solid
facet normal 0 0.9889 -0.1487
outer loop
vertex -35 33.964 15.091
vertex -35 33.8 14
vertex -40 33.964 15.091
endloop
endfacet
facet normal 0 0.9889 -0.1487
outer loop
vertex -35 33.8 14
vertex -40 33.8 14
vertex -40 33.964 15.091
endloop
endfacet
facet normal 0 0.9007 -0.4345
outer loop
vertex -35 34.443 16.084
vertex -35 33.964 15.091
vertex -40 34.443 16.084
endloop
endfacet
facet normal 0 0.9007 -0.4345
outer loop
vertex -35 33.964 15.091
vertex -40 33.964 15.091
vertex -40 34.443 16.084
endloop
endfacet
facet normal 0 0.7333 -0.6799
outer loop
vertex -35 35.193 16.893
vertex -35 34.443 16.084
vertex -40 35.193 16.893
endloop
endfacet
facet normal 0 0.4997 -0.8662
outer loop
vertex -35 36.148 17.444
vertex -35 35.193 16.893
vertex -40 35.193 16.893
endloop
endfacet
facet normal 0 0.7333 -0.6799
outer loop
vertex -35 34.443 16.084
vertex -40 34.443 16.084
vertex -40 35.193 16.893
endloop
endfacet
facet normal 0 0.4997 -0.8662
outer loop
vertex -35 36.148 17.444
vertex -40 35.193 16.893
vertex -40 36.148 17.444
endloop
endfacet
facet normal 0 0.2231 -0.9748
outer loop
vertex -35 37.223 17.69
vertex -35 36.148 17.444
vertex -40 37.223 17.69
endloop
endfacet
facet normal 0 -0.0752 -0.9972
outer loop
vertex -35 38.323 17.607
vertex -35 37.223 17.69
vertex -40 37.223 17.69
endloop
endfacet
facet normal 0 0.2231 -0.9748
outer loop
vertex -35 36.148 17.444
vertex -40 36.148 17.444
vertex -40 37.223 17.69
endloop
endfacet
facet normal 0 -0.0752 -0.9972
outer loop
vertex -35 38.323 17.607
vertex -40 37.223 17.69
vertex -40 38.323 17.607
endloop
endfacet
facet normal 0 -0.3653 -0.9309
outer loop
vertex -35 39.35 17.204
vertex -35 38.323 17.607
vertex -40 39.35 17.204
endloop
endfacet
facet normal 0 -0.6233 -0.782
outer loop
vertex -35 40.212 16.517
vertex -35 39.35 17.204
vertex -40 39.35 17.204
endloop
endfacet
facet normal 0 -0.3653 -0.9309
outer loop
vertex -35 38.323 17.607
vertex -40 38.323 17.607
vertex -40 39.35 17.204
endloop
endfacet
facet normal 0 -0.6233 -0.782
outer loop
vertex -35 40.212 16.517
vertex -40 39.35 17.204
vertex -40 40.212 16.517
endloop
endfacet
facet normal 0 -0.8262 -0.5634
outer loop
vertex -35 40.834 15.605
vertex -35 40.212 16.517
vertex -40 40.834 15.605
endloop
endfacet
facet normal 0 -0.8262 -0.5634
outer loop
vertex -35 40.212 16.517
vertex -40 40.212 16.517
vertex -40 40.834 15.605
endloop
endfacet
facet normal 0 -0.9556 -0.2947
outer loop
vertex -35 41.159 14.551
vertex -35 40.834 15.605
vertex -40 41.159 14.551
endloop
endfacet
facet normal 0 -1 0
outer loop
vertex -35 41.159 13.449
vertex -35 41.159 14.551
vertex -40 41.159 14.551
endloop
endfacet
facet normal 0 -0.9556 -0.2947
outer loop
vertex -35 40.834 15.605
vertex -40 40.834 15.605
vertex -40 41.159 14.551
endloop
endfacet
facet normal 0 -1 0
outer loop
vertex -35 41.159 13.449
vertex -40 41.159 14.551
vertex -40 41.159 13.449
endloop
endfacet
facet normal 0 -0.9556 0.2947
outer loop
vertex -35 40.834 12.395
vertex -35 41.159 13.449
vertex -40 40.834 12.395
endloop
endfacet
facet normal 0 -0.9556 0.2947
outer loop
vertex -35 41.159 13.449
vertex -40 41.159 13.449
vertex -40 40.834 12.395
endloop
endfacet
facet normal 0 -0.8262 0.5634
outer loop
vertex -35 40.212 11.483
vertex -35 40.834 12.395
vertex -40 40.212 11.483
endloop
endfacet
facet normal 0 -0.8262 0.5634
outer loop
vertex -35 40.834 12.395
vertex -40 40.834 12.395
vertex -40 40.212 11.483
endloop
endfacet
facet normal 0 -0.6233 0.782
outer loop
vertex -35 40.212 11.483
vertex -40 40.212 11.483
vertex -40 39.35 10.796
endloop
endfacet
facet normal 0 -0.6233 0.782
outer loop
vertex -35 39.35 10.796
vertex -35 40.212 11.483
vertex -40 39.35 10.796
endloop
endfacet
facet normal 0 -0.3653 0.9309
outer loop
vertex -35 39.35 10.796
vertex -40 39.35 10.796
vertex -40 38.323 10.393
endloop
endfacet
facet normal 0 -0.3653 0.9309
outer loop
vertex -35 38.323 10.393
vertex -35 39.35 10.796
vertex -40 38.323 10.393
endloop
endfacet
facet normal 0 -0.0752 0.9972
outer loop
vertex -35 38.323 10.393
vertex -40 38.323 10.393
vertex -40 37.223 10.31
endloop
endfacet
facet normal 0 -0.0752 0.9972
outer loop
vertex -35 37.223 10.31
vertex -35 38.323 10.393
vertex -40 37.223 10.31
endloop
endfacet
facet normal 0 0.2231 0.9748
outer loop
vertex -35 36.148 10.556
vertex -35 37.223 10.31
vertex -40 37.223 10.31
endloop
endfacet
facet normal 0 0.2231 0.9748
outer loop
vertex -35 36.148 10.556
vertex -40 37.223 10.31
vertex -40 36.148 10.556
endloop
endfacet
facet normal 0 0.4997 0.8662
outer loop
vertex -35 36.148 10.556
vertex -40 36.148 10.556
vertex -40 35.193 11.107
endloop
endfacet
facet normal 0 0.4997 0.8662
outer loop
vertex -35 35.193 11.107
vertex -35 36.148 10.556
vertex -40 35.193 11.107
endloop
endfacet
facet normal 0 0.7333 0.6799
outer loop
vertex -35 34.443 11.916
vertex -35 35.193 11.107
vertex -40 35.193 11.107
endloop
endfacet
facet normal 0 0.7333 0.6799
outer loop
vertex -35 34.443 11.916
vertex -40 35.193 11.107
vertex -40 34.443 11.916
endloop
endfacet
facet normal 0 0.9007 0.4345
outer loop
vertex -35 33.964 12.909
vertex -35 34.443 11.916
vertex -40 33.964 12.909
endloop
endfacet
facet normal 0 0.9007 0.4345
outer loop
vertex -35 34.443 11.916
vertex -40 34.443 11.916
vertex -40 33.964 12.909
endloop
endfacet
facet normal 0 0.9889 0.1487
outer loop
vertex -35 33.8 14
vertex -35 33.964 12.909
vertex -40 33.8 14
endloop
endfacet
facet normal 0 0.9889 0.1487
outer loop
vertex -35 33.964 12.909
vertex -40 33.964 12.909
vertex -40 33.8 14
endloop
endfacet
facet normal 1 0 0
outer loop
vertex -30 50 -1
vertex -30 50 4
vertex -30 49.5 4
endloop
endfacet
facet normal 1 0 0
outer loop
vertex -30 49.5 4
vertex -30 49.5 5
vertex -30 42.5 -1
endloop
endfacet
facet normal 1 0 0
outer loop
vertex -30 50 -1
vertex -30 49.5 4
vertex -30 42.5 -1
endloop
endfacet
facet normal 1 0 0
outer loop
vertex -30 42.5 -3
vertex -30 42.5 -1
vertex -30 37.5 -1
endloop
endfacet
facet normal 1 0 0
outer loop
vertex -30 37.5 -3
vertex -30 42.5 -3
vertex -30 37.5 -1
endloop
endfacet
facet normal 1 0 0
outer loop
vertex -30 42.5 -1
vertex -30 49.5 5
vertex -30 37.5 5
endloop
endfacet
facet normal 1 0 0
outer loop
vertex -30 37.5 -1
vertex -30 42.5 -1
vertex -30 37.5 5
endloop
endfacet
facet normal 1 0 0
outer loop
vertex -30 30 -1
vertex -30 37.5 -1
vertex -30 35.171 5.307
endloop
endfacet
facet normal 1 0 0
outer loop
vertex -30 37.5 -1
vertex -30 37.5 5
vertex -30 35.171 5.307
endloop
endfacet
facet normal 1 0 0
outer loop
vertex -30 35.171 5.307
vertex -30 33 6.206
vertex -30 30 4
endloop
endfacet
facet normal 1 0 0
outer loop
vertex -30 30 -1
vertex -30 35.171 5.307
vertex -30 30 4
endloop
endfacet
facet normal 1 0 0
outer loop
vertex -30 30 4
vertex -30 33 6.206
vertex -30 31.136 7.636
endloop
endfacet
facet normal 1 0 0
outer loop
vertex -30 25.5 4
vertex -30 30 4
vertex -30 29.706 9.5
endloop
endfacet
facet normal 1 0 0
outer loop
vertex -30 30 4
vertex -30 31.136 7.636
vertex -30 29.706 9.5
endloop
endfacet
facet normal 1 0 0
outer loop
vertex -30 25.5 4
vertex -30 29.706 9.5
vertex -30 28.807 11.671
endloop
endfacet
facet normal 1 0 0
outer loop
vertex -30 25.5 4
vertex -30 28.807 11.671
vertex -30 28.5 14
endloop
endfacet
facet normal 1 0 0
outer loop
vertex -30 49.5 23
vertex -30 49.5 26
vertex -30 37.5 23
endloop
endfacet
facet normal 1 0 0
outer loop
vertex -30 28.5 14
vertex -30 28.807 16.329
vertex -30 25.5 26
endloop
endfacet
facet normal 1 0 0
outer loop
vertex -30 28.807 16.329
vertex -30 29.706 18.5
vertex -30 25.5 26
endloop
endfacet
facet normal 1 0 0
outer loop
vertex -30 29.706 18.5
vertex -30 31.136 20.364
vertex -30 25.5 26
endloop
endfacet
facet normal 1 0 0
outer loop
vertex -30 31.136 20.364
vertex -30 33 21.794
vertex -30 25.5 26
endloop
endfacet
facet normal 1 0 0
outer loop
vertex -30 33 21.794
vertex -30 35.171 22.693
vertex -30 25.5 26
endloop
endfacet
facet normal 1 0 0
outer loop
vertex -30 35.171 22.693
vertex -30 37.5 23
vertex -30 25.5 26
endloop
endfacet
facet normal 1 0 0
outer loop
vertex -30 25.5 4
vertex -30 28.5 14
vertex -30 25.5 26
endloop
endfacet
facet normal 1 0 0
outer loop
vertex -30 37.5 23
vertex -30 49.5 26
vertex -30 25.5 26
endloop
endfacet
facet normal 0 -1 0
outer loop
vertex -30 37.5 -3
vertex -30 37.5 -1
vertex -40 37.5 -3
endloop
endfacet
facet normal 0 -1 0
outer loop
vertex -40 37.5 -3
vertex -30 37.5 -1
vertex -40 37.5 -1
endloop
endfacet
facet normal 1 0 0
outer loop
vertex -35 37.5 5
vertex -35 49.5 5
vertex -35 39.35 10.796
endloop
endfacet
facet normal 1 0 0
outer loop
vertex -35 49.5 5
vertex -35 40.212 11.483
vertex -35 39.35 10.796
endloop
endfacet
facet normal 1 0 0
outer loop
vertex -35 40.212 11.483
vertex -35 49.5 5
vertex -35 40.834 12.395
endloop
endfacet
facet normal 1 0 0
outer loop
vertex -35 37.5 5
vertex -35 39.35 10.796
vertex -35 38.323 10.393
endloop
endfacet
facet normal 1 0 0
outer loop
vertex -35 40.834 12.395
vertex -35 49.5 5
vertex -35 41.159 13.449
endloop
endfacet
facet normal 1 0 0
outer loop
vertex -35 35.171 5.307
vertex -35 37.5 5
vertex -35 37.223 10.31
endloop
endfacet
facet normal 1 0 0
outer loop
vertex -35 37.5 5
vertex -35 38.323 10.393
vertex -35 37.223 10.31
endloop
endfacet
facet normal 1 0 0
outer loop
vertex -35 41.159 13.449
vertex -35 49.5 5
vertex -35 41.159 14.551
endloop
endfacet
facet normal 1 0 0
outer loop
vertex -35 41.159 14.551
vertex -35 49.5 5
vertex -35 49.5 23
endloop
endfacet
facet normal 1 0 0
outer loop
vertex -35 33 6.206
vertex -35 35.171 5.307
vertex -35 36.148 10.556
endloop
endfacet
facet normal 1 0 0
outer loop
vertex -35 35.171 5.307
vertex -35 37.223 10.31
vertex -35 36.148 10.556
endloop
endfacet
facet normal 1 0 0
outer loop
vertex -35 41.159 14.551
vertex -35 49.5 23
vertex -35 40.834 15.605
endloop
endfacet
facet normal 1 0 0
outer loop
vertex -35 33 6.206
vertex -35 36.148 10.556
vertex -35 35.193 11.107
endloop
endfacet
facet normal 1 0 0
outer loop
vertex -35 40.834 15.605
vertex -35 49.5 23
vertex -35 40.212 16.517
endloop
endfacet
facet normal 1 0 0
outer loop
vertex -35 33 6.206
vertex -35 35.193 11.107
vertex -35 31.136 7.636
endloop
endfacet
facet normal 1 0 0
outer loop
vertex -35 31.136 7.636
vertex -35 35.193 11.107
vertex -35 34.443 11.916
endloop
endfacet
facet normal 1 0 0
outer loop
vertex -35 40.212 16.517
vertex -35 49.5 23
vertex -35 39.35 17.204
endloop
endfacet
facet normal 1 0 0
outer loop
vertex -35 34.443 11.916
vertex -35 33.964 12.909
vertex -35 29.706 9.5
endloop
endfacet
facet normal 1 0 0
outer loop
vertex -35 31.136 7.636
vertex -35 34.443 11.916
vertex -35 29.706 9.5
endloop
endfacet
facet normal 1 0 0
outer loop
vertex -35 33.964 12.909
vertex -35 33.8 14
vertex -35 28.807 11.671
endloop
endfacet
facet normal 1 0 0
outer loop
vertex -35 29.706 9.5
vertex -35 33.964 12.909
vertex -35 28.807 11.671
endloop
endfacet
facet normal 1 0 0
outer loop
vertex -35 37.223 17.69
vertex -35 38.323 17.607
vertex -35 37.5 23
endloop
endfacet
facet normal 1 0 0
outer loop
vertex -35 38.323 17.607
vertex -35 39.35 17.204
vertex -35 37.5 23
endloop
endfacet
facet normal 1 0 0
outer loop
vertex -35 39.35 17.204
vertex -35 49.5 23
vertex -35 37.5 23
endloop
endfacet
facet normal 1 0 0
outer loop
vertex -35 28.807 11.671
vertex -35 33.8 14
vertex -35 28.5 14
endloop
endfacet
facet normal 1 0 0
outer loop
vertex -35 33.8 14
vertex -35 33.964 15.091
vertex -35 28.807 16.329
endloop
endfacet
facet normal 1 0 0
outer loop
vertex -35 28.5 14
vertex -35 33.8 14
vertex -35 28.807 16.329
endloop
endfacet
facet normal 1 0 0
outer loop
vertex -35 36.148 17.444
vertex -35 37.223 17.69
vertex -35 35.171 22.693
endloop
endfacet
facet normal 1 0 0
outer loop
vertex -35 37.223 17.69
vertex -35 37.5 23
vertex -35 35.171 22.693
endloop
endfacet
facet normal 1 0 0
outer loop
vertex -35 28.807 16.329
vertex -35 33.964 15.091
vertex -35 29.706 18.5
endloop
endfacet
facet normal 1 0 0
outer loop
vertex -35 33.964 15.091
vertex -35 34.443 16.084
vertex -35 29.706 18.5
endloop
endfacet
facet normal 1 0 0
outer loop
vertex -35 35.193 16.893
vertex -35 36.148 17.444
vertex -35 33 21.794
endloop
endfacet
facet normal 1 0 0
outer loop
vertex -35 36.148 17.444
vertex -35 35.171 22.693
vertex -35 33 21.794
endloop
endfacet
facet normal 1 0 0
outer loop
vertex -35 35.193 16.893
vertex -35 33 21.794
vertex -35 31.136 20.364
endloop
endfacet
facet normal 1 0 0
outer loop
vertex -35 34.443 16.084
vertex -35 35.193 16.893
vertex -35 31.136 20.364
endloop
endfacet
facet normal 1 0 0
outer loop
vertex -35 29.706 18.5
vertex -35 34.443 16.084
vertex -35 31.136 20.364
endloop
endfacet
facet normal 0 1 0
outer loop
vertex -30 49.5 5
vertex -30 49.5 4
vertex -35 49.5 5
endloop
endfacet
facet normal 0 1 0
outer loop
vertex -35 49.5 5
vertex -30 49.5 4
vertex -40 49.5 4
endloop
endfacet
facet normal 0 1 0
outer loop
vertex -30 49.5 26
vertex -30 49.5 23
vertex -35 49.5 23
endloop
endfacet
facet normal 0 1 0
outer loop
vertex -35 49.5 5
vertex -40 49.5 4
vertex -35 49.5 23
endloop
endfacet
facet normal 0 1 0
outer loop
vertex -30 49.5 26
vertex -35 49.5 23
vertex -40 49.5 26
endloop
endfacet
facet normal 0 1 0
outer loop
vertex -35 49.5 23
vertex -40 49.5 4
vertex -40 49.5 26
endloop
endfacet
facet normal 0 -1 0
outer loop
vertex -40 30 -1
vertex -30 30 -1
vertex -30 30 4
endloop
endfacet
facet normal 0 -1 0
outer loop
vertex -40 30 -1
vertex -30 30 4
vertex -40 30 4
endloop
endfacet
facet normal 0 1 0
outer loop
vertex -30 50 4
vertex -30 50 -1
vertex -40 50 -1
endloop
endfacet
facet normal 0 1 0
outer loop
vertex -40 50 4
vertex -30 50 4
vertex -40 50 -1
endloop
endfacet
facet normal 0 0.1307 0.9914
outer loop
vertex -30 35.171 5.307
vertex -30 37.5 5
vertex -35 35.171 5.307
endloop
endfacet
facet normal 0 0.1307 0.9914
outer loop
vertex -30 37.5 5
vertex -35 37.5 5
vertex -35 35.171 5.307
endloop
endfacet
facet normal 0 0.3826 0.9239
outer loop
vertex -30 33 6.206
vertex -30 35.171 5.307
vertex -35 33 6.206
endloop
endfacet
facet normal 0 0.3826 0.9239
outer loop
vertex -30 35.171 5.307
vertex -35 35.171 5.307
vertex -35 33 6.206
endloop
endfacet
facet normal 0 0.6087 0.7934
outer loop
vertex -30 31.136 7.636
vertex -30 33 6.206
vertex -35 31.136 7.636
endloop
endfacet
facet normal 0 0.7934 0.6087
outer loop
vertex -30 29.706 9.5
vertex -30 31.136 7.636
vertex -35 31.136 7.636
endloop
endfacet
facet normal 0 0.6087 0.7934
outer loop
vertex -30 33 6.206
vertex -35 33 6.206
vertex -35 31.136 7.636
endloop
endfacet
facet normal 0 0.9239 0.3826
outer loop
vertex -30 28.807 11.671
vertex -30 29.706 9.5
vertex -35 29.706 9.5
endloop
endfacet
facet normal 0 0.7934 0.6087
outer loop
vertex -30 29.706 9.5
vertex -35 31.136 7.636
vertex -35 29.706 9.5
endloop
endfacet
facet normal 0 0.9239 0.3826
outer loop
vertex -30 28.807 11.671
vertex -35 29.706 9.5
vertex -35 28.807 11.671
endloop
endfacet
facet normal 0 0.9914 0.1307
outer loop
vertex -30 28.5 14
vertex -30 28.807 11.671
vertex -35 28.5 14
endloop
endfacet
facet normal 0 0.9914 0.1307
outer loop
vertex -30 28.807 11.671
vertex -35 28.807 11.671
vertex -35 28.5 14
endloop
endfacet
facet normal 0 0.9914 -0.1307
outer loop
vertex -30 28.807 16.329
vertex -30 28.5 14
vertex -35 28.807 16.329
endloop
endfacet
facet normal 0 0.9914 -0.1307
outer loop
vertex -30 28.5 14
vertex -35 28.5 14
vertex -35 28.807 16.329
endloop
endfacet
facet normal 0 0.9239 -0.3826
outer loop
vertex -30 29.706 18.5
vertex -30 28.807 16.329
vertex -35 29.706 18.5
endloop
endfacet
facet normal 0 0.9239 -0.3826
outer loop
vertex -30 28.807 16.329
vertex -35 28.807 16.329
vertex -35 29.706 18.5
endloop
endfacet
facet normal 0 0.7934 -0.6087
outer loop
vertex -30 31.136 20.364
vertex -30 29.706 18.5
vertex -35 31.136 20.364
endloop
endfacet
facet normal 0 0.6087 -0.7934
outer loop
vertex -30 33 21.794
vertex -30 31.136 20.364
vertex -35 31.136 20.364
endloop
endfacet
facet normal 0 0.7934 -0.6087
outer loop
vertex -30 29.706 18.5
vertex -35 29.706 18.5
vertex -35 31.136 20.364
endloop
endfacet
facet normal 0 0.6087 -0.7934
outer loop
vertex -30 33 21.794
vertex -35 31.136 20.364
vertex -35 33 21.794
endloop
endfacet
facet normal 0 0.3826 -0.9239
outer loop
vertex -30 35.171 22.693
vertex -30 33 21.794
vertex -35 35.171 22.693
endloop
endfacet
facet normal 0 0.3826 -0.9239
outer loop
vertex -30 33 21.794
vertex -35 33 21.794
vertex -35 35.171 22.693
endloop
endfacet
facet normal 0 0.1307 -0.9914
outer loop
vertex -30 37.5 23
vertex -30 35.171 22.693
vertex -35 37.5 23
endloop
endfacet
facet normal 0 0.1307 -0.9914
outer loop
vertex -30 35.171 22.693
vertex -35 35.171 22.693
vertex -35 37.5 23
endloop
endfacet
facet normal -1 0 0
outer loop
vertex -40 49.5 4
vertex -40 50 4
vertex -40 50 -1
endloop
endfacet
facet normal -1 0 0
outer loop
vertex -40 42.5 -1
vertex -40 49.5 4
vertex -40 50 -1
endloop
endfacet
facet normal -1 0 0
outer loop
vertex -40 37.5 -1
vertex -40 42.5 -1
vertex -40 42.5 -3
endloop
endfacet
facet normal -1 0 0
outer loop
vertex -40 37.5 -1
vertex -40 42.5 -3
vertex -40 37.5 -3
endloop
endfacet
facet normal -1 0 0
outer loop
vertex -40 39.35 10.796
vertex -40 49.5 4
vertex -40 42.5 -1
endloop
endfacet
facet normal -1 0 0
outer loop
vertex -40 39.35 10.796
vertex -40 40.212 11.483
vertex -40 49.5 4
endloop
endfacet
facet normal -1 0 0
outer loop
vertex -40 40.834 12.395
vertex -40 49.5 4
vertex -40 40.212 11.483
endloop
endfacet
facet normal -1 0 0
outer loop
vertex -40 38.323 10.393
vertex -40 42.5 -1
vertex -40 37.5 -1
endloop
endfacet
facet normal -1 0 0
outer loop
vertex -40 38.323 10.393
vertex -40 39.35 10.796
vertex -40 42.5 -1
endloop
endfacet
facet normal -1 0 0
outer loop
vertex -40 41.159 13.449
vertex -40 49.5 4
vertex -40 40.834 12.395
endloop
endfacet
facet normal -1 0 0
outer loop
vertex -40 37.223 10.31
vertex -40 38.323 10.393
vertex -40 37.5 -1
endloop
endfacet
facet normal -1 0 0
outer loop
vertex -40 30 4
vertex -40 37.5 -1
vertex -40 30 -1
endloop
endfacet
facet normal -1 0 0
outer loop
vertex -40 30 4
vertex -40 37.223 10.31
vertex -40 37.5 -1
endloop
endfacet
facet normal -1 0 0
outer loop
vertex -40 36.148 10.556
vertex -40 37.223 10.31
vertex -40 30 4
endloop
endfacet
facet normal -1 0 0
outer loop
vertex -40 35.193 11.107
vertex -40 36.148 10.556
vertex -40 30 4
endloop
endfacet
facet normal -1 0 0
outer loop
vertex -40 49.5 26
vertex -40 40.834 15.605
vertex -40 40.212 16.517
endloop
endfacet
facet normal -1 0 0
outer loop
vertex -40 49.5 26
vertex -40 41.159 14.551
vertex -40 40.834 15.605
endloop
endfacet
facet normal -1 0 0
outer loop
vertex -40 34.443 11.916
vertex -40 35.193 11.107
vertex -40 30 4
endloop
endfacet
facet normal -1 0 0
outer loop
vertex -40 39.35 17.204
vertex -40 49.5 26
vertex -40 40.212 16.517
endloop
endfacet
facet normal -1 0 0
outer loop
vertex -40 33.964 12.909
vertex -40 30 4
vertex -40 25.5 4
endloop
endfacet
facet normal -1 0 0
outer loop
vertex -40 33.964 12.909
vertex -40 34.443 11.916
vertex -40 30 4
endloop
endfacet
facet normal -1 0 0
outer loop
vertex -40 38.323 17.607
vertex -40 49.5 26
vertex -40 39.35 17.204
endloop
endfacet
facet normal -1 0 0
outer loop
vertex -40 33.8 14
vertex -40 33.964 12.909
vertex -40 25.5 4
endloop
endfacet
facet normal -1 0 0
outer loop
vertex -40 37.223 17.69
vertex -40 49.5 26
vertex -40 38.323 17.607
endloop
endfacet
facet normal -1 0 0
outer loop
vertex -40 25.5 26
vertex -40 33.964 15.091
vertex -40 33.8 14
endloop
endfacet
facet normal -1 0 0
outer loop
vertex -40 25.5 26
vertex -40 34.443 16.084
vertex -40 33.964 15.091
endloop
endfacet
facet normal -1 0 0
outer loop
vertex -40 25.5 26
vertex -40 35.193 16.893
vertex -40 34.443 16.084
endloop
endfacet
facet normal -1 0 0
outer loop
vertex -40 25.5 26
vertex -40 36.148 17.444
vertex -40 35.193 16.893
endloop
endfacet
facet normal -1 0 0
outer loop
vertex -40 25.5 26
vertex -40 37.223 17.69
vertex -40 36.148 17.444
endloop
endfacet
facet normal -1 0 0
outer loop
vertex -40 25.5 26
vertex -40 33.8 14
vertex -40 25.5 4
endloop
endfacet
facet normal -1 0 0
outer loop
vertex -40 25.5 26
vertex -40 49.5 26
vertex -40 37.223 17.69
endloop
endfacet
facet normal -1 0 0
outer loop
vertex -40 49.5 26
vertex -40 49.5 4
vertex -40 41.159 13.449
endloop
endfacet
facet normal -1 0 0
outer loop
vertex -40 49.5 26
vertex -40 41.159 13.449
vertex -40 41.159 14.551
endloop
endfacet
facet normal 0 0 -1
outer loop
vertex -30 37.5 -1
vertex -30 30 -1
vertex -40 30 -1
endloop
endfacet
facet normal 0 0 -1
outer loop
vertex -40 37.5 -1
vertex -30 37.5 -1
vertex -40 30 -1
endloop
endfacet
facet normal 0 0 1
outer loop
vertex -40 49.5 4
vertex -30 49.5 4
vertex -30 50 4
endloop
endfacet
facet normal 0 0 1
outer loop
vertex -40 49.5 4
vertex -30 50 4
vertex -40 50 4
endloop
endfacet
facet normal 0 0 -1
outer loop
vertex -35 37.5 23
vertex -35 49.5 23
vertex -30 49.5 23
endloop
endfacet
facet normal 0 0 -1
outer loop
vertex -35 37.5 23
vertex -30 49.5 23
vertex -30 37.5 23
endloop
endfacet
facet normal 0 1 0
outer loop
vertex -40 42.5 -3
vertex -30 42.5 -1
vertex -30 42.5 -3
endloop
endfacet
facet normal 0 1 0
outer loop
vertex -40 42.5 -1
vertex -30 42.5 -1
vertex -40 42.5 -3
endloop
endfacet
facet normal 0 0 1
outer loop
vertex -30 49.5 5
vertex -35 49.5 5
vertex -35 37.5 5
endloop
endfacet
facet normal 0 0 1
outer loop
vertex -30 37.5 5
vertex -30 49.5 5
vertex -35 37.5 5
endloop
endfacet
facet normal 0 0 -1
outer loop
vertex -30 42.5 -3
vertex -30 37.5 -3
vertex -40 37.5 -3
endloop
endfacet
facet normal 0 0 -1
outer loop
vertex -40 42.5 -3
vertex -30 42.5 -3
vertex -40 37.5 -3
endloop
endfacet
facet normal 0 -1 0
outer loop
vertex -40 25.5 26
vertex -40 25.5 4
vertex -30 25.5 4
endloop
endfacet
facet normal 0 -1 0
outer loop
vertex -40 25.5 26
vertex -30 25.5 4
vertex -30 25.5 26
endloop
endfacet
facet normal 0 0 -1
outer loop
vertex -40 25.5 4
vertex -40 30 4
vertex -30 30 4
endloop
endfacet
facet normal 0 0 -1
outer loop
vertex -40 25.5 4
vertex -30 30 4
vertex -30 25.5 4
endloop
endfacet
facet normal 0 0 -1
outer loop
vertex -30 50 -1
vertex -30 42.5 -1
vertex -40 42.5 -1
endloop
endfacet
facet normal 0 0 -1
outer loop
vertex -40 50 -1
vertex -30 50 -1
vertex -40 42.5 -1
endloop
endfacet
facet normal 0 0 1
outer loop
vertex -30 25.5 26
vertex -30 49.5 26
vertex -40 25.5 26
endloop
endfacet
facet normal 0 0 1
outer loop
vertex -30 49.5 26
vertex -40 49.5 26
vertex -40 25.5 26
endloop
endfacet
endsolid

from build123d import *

# Parameters (mm, degrees)
SKETCH052_W             = 10
SKETCH052_H             = 20
PAD024_DEPTH            = 5
SKETCH049_W             = 10
SKETCH049_H             = 10
PAD023_DEPTH            = 6
SKETCH050_W             = 24
SKETCH050_H             = 22
PAD025_DEPTH            = 5
SKETCH048_W             = 16
SKETCH048_H             = 18
POCKET019_DEPTH         = 6
SKETCH051_R             = 3.7
POCKET018_DEPTH         = 10
SKETCH053_W             = 10
SKETCH053_H             = 5
PAD026_DEPTH            = 2
SKETCH064_R             = 9
POCKET024_DEPTH         = 5
BODY010_PLACEMENT_ANGLE = 180


with BuildPart() as part:
    # Sketch052 → Pad024 (new body)
    with BuildSketch(Plane.XY):
        with Locations((0, -2.5)):
            Rectangle(SKETCH052_W, SKETCH052_H)
    extrude(amount=PAD024_DEPTH)

    # Sketch049 → Pad023 (join)
    with BuildSketch(Plane.XY):
        Rectangle(SKETCH049_W, SKETCH049_H)
    extrude(amount=PAD023_DEPTH)

    # Sketch050 → Pad025 (join, symmetric)
    with BuildSketch(Plane.YZ):
        with Locations((0, 16)):
            Rectangle(SKETCH050_W, SKETCH050_H)
    extrude(amount=PAD025_DEPTH, both=True)

    # Sketch048 → Pocket019 (cut)
    with BuildSketch(Plane.YZ):
        with Locations((-8, 15)):
            Rectangle(SKETCH048_W, SKETCH048_H)
    extrude(amount=-POCKET019_DEPTH, mode=Mode.SUBTRACT)

    # Sketch051 → Pocket018 (cut, symmetric)
    with BuildSketch(Plane.YZ):
        with Locations((0, 15)):
            Circle(SKETCH051_R)
    extrude(amount=POCKET018_DEPTH, both=True, mode=Mode.SUBTRACT)

    # Sketch053 → Pad026 (join)
    with BuildSketch(Plane.XY):
        with Locations((0, -2.5)):
            Rectangle(SKETCH053_W, SKETCH053_H)
    extrude(amount=-PAD026_DEPTH)

    # Sketch064 → Pocket024 (cut)
    with BuildSketch(Plane.YZ):
        with Locations((0, 15)):
            Circle(SKETCH064_R)
    extrude(amount=-POCKET024_DEPTH, mode=Mode.SUBTRACT)


with BuildPart() as part_1:
    # Body010 placement: moved
    add(part.part.moved(Location((-35, 37.5, -1))).rotate(Axis((-35, 37.5, -1), (0, 0, 1)), BODY010_PLACEMENT_ANGLE))


solid = part_1.part
